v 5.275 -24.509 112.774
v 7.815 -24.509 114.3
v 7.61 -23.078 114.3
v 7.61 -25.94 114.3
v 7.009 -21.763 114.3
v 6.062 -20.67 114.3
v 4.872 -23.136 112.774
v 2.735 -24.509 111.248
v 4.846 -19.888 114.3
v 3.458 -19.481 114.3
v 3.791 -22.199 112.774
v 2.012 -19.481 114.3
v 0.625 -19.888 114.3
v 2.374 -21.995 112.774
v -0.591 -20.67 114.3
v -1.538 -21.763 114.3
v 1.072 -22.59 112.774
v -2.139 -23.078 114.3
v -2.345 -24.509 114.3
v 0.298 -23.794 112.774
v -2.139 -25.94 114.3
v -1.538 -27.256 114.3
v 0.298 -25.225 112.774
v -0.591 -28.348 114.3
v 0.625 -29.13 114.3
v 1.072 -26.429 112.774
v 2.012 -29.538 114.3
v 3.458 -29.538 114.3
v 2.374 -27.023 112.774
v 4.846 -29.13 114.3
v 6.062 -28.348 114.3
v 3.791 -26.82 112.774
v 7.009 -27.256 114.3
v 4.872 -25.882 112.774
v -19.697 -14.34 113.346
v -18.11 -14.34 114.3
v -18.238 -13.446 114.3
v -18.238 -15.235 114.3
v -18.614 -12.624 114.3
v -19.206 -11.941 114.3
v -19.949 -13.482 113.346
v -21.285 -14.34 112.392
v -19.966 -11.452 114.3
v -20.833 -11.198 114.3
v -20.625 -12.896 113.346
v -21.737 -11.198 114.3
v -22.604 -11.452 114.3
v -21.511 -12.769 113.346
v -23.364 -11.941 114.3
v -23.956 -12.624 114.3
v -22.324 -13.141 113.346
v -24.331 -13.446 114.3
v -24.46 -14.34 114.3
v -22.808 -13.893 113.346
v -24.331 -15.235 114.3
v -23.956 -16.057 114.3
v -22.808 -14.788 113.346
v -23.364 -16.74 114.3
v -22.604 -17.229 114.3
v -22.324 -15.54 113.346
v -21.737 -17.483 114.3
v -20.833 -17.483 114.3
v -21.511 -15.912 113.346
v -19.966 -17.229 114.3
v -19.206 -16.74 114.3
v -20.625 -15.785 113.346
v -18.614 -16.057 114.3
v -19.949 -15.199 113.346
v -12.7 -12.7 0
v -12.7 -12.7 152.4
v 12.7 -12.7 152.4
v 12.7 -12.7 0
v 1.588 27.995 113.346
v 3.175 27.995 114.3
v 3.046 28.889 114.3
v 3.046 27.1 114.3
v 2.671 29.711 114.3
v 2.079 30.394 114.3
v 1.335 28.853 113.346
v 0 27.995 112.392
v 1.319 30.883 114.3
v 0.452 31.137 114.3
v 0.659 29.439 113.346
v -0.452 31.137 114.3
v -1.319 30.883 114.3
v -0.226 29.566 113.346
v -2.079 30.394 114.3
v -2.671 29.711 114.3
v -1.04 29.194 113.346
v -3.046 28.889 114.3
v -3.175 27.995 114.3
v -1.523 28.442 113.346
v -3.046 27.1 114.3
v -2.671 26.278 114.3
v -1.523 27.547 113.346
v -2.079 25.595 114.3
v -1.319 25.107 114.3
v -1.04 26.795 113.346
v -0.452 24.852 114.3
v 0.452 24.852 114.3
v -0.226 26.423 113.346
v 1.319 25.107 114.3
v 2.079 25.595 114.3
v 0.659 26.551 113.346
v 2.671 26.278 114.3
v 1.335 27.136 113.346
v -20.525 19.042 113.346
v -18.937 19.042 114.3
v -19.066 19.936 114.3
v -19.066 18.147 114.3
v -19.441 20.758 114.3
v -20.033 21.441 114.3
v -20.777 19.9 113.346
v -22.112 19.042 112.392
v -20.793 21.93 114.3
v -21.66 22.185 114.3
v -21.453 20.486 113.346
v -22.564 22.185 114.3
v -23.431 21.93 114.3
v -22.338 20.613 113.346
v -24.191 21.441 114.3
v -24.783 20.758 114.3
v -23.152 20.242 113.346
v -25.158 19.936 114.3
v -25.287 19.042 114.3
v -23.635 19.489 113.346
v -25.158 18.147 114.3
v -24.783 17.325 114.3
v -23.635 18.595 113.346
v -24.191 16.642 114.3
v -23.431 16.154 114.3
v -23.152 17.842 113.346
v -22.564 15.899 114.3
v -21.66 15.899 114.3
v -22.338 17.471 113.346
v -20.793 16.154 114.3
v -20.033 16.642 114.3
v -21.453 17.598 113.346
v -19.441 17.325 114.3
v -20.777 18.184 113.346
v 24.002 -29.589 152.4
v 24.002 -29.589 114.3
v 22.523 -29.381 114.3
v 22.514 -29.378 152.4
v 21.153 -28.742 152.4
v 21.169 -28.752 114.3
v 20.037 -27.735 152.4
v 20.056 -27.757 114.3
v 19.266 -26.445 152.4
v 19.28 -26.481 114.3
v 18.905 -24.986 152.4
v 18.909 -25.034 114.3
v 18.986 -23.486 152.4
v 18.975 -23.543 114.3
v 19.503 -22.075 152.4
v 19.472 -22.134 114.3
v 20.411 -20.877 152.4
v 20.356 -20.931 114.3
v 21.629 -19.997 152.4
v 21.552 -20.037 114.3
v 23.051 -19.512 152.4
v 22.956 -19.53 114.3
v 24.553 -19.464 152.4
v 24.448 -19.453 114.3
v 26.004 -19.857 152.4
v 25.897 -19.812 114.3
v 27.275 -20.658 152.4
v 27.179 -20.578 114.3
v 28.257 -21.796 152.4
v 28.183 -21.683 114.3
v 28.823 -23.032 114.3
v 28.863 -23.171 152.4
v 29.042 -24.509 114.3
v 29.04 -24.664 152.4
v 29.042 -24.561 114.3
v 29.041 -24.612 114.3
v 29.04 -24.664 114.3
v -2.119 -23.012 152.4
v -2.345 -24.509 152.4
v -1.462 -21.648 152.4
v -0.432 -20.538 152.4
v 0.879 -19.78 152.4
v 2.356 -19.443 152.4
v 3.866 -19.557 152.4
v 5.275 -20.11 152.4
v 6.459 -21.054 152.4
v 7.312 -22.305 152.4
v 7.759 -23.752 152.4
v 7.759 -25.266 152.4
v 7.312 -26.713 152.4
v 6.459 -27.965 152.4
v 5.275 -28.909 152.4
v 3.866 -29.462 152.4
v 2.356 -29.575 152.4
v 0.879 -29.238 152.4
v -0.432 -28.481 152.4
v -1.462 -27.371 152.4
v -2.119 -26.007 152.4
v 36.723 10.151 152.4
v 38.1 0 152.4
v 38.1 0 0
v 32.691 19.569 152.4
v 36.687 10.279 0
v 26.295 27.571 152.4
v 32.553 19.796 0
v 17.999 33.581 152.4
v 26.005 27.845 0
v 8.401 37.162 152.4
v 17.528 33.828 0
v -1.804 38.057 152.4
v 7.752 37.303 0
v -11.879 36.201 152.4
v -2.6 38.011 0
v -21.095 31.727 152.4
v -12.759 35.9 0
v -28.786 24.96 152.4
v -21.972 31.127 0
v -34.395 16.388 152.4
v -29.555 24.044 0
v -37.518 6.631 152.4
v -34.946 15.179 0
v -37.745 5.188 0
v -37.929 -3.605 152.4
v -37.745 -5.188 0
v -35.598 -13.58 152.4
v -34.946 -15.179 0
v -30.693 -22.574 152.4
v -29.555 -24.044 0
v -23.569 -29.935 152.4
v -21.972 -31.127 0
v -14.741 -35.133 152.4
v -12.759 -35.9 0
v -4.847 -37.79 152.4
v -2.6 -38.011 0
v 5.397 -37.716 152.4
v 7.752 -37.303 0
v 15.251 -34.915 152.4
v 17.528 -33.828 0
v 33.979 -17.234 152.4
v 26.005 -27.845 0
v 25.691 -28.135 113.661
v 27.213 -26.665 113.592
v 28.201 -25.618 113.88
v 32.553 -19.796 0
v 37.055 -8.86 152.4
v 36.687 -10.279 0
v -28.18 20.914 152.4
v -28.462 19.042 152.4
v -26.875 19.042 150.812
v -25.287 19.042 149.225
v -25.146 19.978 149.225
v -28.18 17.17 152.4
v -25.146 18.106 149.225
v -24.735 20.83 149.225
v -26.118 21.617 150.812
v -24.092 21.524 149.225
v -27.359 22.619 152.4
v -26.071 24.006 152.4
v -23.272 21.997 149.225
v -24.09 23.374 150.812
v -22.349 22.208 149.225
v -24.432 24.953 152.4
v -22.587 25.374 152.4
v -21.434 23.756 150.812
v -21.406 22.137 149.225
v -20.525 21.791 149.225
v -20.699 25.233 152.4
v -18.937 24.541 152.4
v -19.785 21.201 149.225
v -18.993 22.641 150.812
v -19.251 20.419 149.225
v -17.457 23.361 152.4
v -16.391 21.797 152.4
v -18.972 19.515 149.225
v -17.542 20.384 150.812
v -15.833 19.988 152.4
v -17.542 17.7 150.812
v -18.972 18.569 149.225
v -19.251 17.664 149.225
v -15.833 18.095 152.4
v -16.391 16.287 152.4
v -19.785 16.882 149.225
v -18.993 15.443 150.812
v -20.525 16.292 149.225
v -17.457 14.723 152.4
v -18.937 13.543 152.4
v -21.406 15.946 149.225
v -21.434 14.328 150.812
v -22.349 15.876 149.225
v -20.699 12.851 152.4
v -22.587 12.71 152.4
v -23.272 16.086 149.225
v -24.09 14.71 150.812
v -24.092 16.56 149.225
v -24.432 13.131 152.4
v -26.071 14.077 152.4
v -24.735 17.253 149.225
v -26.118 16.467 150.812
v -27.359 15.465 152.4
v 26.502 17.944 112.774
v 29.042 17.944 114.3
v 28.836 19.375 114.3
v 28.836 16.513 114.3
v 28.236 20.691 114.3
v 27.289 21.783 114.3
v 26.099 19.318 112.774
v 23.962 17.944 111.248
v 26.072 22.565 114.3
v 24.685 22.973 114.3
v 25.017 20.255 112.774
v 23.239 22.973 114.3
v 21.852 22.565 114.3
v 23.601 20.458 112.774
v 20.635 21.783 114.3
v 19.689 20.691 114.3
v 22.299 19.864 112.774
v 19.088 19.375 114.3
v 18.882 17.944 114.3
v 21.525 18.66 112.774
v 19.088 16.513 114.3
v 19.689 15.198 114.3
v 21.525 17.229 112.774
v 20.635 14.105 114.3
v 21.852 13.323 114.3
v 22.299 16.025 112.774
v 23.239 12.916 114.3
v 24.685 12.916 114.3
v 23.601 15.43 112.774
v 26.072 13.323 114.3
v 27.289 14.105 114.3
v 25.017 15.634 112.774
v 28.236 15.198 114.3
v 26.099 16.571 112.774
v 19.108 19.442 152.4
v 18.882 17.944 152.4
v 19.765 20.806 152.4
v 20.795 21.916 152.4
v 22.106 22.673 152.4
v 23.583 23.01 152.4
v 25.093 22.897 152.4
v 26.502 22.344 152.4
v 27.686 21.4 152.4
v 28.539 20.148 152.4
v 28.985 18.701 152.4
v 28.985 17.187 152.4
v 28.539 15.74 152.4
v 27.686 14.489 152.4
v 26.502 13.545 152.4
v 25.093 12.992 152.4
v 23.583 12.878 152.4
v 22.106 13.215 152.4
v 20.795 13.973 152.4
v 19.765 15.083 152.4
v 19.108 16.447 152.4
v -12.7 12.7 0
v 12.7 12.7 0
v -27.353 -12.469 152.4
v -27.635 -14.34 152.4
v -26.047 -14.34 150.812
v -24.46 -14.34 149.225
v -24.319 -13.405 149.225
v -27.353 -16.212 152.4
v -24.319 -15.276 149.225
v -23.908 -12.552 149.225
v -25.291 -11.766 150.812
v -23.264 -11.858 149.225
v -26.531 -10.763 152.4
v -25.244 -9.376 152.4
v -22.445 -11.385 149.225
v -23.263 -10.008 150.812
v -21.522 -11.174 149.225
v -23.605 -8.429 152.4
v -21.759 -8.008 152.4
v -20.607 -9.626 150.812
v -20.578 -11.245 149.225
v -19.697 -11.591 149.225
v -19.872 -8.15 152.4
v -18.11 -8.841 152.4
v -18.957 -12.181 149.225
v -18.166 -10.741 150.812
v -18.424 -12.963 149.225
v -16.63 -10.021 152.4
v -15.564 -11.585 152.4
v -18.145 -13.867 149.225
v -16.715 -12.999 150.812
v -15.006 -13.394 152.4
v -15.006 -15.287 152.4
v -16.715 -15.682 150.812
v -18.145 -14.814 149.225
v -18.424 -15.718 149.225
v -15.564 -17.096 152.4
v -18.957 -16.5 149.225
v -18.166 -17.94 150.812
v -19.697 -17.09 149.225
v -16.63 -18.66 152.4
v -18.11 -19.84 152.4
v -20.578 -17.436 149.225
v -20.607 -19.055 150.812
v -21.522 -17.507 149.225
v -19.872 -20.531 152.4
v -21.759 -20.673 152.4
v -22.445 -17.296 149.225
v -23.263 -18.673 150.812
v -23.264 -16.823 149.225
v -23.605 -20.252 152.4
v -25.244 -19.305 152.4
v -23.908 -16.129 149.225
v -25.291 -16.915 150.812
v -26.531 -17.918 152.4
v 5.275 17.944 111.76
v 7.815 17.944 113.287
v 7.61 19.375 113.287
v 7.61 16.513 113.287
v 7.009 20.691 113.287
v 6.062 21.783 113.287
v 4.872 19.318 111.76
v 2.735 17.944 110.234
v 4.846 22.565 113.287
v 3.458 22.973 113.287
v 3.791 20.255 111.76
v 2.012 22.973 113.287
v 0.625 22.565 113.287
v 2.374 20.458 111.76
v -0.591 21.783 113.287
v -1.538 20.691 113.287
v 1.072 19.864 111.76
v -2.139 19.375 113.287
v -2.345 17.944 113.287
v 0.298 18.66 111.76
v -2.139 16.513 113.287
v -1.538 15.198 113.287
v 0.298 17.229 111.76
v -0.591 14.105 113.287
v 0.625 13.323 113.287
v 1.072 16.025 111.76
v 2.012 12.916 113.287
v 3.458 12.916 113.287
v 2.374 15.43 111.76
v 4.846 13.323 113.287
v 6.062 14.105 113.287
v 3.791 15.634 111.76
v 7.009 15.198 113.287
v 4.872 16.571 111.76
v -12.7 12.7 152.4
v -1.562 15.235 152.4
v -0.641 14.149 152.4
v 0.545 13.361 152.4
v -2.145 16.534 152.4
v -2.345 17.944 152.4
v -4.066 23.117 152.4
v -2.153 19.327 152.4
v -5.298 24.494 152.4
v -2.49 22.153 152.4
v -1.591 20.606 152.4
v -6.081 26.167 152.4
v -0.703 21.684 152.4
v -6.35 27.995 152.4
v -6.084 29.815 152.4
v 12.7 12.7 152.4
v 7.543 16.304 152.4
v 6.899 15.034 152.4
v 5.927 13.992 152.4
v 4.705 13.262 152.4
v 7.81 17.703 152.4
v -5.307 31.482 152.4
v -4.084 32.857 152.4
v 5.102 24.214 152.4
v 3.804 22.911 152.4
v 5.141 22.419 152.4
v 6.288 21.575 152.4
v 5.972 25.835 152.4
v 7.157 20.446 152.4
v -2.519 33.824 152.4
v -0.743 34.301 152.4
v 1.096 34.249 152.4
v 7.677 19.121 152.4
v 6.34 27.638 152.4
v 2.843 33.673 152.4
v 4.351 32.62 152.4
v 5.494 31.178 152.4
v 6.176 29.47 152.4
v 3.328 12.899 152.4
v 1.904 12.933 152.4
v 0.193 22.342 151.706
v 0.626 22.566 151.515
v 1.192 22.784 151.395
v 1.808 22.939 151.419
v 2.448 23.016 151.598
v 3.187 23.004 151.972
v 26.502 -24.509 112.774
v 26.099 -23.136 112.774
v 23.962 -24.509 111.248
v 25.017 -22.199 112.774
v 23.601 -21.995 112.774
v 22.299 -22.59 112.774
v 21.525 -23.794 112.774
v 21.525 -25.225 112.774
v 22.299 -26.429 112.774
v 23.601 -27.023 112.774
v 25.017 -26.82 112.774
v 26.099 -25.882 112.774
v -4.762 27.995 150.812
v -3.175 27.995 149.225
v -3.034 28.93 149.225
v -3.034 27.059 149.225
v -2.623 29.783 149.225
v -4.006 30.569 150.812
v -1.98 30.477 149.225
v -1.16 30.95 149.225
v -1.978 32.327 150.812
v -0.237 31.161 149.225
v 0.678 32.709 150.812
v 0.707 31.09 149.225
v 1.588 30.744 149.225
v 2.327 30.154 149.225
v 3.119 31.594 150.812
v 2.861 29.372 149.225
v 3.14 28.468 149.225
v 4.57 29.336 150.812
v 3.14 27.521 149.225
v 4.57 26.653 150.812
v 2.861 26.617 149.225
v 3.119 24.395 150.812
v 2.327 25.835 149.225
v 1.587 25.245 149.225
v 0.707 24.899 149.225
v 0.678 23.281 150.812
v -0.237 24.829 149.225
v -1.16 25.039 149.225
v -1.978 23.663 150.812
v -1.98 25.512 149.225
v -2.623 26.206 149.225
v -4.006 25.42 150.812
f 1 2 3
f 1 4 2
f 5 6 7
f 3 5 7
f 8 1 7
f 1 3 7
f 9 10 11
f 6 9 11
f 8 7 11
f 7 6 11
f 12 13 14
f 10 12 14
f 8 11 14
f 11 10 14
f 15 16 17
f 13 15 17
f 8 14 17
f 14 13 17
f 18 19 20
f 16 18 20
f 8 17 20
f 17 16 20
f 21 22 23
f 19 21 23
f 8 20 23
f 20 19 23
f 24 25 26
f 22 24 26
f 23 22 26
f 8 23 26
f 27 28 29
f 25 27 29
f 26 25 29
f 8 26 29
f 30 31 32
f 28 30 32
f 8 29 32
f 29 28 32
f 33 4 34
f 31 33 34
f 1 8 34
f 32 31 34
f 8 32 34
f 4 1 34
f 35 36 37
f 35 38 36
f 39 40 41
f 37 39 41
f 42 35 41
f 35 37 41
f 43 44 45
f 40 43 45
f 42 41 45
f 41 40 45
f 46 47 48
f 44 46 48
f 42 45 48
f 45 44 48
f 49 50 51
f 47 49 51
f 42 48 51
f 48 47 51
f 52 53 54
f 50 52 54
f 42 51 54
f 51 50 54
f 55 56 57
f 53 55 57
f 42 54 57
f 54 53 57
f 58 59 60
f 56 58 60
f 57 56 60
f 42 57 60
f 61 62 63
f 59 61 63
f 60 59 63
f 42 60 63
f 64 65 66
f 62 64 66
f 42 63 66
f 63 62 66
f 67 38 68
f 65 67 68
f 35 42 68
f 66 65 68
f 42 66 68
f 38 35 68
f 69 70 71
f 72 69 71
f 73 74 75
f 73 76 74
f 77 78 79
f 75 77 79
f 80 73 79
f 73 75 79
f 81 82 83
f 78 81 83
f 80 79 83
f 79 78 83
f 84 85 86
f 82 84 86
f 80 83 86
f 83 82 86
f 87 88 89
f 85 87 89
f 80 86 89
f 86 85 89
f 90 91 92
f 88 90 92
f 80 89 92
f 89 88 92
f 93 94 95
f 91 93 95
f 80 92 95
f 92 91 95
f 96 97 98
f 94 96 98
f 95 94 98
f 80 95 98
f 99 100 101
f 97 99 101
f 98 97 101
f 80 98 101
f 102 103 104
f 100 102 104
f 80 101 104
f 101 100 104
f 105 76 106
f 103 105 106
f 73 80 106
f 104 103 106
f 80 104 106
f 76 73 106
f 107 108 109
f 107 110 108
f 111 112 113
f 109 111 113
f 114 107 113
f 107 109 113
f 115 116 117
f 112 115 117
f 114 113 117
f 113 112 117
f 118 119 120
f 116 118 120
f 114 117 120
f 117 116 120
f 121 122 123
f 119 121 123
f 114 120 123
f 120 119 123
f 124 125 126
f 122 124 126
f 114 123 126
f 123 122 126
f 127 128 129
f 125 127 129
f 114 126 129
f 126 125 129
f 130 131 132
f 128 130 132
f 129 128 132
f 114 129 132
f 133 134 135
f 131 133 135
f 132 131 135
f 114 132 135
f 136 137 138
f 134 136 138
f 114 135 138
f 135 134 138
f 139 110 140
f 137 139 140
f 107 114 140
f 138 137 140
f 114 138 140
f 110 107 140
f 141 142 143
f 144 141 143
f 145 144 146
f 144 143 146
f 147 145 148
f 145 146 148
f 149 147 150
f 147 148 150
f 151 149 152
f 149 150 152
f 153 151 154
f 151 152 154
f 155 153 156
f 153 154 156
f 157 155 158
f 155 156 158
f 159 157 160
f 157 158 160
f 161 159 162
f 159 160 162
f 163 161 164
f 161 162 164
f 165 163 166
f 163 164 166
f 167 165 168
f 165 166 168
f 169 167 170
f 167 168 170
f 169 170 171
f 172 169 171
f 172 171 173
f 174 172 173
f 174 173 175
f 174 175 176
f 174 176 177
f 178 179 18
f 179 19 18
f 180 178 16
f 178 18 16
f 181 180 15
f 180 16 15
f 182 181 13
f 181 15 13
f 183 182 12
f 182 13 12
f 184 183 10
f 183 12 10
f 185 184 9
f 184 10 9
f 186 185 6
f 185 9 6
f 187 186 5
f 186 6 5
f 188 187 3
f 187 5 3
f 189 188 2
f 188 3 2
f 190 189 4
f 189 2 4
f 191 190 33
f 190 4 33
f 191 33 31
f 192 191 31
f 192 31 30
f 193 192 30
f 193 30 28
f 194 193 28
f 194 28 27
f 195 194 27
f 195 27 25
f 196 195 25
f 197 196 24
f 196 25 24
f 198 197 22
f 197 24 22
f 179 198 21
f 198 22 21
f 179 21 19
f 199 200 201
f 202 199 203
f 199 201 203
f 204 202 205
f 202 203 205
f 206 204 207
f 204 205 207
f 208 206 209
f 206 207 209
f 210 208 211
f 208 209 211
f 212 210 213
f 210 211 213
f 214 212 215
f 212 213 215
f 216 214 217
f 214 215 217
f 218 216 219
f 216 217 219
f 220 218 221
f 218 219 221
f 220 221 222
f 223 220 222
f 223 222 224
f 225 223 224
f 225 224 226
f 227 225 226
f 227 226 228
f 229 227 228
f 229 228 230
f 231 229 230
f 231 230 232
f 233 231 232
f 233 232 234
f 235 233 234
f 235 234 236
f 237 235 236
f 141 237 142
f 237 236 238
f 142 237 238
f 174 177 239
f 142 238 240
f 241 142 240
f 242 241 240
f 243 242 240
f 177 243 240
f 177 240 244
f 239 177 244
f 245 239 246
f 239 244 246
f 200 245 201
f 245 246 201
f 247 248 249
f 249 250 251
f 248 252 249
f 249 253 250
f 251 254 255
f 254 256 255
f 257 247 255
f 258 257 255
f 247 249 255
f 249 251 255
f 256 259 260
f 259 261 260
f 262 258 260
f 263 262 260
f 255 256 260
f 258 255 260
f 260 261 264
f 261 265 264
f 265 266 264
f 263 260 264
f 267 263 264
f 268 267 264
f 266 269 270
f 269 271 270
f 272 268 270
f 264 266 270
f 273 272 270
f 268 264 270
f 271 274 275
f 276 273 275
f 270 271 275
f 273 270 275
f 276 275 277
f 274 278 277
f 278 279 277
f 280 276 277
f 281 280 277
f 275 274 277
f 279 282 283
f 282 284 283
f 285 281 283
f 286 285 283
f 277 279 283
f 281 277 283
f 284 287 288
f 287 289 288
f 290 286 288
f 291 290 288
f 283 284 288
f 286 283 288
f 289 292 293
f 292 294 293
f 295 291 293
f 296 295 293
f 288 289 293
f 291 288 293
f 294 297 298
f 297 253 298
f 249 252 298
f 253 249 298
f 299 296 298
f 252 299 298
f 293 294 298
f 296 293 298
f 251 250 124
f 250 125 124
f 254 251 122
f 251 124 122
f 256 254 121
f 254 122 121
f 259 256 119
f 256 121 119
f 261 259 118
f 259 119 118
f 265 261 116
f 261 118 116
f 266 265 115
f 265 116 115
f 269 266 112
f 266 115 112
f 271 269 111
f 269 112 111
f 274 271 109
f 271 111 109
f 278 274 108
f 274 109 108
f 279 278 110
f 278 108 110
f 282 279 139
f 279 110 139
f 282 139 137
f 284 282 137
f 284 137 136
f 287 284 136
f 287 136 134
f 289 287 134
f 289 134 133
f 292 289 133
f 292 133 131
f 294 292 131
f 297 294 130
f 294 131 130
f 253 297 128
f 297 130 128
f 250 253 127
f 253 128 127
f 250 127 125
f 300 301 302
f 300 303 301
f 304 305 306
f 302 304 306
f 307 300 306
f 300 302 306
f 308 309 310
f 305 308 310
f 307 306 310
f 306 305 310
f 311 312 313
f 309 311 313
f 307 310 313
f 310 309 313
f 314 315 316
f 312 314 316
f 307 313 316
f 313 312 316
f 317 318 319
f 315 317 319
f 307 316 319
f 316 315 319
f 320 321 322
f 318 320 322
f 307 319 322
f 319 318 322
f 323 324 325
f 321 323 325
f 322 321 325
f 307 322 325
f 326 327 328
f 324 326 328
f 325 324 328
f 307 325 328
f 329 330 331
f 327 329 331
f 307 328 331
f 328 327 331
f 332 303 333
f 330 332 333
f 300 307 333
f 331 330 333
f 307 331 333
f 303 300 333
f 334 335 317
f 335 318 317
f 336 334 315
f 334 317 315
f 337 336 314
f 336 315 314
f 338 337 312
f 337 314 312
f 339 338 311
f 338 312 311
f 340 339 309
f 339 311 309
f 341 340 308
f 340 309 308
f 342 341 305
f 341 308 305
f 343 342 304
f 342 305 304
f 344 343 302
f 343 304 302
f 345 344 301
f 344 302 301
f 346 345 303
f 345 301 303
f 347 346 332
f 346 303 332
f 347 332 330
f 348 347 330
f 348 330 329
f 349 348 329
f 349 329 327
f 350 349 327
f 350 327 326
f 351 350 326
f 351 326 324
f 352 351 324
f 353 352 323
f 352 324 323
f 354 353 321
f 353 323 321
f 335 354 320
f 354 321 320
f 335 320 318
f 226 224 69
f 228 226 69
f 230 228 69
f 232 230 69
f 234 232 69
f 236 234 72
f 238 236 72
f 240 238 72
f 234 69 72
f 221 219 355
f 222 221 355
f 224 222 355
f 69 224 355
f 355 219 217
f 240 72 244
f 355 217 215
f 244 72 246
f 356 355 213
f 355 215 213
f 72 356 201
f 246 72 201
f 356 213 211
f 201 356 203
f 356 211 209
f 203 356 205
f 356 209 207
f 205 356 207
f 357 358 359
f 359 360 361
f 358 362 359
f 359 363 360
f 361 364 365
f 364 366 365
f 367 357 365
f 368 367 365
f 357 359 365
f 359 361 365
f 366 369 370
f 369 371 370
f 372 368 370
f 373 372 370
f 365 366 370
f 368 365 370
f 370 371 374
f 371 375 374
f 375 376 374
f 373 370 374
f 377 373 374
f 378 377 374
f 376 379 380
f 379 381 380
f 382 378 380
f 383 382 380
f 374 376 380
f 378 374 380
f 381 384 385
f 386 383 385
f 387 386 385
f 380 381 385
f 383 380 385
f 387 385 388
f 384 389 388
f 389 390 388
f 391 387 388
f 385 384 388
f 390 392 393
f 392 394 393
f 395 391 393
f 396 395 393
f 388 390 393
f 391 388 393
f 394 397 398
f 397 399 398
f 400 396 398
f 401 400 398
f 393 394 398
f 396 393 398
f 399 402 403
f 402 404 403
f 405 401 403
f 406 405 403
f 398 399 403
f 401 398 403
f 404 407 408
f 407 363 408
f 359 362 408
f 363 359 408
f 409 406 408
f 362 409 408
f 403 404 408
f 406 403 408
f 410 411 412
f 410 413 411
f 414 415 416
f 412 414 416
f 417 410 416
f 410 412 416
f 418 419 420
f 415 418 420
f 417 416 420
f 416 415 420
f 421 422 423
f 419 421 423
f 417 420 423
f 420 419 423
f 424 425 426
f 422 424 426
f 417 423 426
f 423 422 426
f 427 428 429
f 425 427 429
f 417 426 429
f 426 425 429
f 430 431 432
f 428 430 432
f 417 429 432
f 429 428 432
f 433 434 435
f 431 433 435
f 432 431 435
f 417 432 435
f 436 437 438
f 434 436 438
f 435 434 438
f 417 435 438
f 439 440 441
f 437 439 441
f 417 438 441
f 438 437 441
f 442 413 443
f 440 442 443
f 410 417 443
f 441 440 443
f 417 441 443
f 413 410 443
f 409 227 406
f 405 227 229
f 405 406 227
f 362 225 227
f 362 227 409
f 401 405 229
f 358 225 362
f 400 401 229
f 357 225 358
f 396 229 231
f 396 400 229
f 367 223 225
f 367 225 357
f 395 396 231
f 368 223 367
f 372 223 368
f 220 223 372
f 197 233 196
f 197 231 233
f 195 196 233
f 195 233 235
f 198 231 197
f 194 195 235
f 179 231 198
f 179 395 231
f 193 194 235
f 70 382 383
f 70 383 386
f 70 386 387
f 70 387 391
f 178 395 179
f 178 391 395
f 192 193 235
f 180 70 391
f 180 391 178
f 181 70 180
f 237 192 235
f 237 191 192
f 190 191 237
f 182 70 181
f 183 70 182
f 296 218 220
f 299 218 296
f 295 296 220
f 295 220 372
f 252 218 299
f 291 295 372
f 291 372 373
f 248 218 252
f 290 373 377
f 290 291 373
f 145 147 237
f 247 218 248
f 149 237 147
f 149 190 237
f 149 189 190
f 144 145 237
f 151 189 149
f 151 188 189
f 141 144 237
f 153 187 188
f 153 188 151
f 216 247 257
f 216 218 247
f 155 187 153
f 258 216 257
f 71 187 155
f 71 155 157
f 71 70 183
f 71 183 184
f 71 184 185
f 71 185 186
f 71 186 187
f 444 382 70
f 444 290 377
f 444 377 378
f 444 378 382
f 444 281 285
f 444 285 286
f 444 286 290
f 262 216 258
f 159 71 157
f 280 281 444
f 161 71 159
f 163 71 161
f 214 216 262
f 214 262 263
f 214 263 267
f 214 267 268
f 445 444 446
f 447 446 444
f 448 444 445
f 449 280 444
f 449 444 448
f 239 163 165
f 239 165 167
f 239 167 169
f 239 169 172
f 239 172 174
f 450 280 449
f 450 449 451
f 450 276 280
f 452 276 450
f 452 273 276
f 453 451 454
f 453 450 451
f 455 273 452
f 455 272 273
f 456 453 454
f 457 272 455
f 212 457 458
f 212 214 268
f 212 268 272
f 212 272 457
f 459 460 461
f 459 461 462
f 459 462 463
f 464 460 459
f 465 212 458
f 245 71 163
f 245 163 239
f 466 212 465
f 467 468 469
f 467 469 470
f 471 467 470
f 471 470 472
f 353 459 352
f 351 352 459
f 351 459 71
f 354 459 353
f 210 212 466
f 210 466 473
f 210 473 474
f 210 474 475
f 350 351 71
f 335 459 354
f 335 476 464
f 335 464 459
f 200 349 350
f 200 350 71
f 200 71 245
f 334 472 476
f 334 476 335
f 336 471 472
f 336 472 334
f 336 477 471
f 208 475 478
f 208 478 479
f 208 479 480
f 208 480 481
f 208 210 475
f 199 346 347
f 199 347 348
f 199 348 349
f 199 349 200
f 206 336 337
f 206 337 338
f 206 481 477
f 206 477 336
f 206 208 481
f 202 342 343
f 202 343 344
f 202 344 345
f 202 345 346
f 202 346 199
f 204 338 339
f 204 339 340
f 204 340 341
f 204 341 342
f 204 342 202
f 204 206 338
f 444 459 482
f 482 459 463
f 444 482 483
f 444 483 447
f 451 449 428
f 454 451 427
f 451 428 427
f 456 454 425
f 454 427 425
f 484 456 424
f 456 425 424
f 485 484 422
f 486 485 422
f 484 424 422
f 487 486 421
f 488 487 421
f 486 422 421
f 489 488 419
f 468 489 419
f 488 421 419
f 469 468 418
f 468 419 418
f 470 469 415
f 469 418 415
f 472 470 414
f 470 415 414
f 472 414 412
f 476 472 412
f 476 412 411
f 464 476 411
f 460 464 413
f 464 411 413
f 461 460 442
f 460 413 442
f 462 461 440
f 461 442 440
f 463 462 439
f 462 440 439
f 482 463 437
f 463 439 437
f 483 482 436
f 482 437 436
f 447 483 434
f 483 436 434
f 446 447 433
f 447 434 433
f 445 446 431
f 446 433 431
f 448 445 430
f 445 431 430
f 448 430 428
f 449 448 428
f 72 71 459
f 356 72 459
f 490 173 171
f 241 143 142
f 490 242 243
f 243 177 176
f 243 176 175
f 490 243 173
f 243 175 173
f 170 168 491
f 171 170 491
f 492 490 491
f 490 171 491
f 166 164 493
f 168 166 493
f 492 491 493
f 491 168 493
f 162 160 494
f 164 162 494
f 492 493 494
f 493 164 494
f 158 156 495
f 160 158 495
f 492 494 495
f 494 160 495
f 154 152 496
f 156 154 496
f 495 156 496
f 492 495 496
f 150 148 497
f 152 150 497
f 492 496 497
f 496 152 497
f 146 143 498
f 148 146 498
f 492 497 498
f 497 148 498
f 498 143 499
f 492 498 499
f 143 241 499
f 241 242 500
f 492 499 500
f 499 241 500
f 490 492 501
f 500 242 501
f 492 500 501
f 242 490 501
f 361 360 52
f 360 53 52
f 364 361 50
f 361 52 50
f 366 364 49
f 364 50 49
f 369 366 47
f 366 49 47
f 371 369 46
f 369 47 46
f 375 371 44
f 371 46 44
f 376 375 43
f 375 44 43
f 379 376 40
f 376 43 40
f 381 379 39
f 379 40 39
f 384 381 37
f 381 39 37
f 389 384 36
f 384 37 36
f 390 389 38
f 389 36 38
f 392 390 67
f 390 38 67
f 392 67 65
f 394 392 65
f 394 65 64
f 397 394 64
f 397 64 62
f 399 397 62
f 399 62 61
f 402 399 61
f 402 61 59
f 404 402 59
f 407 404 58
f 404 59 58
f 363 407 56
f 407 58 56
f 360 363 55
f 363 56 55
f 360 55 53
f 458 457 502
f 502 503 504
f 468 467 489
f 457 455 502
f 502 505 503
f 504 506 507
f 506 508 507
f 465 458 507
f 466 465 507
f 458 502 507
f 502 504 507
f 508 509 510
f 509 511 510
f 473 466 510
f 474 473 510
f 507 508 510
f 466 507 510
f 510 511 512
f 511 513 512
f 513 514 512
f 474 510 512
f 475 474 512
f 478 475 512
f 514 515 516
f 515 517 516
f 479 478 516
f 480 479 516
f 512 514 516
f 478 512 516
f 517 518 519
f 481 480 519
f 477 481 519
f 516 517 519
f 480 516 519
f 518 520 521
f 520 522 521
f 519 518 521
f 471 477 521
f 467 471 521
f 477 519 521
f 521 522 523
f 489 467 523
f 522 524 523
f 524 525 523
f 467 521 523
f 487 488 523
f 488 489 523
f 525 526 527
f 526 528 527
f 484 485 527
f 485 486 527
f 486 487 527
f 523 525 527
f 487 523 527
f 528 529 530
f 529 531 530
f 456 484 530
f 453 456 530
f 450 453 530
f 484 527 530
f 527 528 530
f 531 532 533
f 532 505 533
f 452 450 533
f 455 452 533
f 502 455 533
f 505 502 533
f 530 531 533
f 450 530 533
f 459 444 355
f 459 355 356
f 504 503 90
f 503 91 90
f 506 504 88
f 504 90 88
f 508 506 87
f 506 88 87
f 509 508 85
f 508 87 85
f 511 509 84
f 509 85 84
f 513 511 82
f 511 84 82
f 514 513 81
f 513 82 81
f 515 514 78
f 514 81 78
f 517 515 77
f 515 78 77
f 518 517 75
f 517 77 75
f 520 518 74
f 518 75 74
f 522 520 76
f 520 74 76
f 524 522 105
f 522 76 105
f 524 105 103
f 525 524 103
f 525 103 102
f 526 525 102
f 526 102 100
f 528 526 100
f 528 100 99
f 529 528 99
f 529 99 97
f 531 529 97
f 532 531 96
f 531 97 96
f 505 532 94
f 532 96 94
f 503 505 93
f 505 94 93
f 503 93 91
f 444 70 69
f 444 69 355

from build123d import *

# Parameters (mm, degrees)
F0_R           = 38.1
F1_DEPTH       = 152.4
F2_W           = 25.4
F2_H           = 25.4
F3_DEPTH       = 152.4
F5_D           = 6.35
F5_DEPTH       = 38.1
F5_CSINK_D     = 12.7
F5_CSINK_ANGLE = 90
F5_TIP         = 1.9077324654
F7_D           = 10.16
F7_DEPTH       = 38.1
F7_START       = 1.0133538
F7_TIP         = 3.0523719447


with BuildPart() as f1:
    # F0 (on Top) → F1 (new body)
    with BuildSketch(Plane.XY):
        Circle(F0_R)
    extrude(amount=F1_DEPTH)

    # F2 (on face) → F3 (cut, through all)
    with BuildSketch(Plane.XY.offset(152.4)):
        Rectangle(F2_W, F2_H)
    extrude(amount=-F3_DEPTH, mode=Mode.SUBTRACT)

    # F5
    with Locations(Plane.XY.offset(152.4)):
        with Locations((-21.2847962976, -14.3404845148), (-22.1120081842, 19.0418586135), (0, 27.9946457595)):
            CounterSinkHole(F5_D / 2, F5_CSINK_D / 2, depth=F5_DEPTH, counter_sink_angle=F5_CSINK_ANGLE)
            with Locations((0, 0, -(F5_DEPTH + F5_TIP / 2))):  # 118° drill point
                Cone(0, F5_D / 2, F5_TIP, mode=Mode.SUBTRACT)

    # F7
    # its depths count from where the whole tool has entered the part; down to there all is cleared
    with Locations(Plane.XY.offset(152.4)):
        with Locations((2.7354073245, -24.5092585683, 0), (23.9621736109, -24.5092585683, 0), (23.9621736109, 17.9442781955, 0), (2.7354073245, 17.9442781955, -F7_START)):
            Hole(F7_D / 2, depth=F7_DEPTH)
            with Locations((0, 0, -(F7_DEPTH + F7_TIP / 2))):  # 118° drill point
                Cone(0, F7_D / 2, F7_TIP, mode=Mode.SUBTRACT)


solid = f1.part
